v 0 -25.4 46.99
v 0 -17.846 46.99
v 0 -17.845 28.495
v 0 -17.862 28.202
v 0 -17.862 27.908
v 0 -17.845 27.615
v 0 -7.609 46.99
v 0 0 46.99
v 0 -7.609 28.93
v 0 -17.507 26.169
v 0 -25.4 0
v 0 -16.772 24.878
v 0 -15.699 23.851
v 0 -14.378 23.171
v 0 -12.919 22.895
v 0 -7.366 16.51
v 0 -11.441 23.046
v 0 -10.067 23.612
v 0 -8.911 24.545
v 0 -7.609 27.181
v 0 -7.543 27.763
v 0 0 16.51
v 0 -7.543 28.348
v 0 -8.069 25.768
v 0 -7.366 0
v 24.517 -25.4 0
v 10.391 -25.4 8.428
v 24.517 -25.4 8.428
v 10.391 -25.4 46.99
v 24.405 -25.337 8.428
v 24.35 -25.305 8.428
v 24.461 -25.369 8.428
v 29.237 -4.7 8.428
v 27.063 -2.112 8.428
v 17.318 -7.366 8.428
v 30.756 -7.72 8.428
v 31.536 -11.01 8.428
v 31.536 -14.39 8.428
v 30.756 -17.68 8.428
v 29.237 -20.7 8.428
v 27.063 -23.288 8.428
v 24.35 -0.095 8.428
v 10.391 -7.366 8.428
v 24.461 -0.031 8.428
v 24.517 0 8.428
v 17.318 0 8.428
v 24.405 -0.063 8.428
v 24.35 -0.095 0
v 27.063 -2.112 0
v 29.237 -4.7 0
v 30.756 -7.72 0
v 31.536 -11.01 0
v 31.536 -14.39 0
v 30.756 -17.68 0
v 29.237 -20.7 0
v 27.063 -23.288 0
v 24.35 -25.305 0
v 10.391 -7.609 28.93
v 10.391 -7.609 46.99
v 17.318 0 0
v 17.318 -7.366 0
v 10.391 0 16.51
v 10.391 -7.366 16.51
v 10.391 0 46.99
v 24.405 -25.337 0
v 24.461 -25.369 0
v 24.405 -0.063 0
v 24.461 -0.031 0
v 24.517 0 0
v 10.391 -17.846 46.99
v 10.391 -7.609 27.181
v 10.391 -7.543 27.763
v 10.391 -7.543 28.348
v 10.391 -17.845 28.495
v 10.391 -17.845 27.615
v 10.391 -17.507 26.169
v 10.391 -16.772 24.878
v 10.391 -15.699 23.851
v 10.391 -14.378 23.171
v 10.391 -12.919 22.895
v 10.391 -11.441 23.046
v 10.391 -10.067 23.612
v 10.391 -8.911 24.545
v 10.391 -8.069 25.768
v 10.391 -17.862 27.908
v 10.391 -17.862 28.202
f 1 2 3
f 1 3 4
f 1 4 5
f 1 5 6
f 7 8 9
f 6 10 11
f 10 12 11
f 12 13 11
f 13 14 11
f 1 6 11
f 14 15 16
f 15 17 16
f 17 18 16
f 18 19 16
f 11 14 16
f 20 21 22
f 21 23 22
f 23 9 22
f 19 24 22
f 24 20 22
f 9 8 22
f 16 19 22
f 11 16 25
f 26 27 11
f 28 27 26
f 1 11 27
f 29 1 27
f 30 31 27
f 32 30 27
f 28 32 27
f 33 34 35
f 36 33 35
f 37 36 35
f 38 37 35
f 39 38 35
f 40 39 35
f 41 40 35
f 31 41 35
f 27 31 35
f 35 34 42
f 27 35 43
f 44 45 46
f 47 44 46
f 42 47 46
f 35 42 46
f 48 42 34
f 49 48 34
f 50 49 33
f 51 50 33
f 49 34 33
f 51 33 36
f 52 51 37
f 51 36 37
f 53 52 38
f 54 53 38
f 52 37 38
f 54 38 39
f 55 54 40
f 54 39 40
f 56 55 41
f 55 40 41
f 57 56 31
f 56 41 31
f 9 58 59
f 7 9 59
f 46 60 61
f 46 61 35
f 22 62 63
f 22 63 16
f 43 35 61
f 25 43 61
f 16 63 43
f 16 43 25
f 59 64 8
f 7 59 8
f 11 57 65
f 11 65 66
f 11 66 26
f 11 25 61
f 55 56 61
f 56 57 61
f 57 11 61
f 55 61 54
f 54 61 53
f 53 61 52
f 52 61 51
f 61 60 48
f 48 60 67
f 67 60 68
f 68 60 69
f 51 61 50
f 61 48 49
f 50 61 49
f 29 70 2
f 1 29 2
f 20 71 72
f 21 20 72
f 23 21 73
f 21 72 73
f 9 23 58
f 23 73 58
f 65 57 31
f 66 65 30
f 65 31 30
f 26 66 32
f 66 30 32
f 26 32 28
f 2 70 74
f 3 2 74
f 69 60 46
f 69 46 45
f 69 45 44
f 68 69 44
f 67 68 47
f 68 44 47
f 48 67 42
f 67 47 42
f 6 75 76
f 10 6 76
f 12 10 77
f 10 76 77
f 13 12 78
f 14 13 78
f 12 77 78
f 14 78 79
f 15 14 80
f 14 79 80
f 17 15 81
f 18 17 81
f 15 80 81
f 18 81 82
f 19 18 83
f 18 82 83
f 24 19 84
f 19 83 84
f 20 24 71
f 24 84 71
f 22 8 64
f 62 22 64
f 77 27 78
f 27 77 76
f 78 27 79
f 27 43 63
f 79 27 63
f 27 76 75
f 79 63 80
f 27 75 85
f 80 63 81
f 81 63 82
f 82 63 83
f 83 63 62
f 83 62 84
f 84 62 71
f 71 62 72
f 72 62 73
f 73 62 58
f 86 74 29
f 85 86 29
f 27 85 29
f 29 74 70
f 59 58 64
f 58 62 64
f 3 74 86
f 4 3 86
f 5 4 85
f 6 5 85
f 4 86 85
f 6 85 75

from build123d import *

# Parameters (mm, degrees)
F1_DEPTH = 25.4
F3_DEPTH = 25.4
F5_DEPTH = 25.4
F6_W     = 17.318182
F6_H     = 16.51
F7_DEPTH = 7.366


with BuildPart() as f1:
    # F0 (on Front) → F1 (new body)
    with BuildSketch(Plane.XZ):
        Polygon((0, 0), (31.634543, 0), (31.634543, 8.428182), (10.39091, 8.428182), (10.39091, 46.990003), (0, 46.990003), align=None)
    extrude(amount=F1_DEPTH)

    # F2 (on face) → F3 (cut)
    with BuildSketch(Plane.XY.offset(8.428182)):
        with BuildLine():
            ThreePointArc((24.34968, -0.09495), (31.634543, -12.7), (24.34968, -25.30505))
            ThreePointArc((24.34968, -25.30505), (46.19327, -12.7), (24.34968, -0.09495))
        make_face()
    extrude(amount=-F3_DEPTH, mode=Mode.SUBTRACT)

    # F4 (on face) → F5 (cut)
    with BuildSketch(Plane.YZ.offset(10.39091)):
        with BuildLine():
            Line((-17.84547, 27.61518), (-17.845491, 28.49549))
            ThreePointArc((-17.845491, 28.49549), (-17.864271, 28.055334), (-17.84547, 27.61518))
        make_face()
        with BuildLine():
            Line((-17.845925, 46.990003), (-17.845491, 28.49549))
            Line((-17.845491, 28.49549), (-17.84547, 27.61518))
            ThreePointArc((-17.84547, 27.61518), (-12.918515, 22.895384), (-7.609436, 27.180831))
            Line((-7.609436, 27.180831), (-7.609436, 28.93008))
            Line((-7.609436, 28.93008), (-7.609436, 46.990003))
            Line((-7.609436, 46.990003), (-17.845925, 46.990003))
        make_face()
        with BuildLine():
            Line((-7.609436, 28.93008), (-7.609436, 27.180831))
            ThreePointArc((-7.609436, 27.180831), (-7.534841, 28.055456), (-7.609436, 28.93008))
        make_face()
    extrude(amount=-F5_DEPTH, mode=Mode.SUBTRACT)

    # F6 (on face) → F7 (cut)
    with BuildSketch(Plane(origin=(0, 0, 0), x_dir=(-1, 0, 0), z_dir=(0, 1, 0))):
        with Locations((-8.659091, 8.255)):
            Rectangle(F6_W, F6_H)
    extrude(amount=-F7_DEPTH, mode=Mode.SUBTRACT)


solid = f1.part
